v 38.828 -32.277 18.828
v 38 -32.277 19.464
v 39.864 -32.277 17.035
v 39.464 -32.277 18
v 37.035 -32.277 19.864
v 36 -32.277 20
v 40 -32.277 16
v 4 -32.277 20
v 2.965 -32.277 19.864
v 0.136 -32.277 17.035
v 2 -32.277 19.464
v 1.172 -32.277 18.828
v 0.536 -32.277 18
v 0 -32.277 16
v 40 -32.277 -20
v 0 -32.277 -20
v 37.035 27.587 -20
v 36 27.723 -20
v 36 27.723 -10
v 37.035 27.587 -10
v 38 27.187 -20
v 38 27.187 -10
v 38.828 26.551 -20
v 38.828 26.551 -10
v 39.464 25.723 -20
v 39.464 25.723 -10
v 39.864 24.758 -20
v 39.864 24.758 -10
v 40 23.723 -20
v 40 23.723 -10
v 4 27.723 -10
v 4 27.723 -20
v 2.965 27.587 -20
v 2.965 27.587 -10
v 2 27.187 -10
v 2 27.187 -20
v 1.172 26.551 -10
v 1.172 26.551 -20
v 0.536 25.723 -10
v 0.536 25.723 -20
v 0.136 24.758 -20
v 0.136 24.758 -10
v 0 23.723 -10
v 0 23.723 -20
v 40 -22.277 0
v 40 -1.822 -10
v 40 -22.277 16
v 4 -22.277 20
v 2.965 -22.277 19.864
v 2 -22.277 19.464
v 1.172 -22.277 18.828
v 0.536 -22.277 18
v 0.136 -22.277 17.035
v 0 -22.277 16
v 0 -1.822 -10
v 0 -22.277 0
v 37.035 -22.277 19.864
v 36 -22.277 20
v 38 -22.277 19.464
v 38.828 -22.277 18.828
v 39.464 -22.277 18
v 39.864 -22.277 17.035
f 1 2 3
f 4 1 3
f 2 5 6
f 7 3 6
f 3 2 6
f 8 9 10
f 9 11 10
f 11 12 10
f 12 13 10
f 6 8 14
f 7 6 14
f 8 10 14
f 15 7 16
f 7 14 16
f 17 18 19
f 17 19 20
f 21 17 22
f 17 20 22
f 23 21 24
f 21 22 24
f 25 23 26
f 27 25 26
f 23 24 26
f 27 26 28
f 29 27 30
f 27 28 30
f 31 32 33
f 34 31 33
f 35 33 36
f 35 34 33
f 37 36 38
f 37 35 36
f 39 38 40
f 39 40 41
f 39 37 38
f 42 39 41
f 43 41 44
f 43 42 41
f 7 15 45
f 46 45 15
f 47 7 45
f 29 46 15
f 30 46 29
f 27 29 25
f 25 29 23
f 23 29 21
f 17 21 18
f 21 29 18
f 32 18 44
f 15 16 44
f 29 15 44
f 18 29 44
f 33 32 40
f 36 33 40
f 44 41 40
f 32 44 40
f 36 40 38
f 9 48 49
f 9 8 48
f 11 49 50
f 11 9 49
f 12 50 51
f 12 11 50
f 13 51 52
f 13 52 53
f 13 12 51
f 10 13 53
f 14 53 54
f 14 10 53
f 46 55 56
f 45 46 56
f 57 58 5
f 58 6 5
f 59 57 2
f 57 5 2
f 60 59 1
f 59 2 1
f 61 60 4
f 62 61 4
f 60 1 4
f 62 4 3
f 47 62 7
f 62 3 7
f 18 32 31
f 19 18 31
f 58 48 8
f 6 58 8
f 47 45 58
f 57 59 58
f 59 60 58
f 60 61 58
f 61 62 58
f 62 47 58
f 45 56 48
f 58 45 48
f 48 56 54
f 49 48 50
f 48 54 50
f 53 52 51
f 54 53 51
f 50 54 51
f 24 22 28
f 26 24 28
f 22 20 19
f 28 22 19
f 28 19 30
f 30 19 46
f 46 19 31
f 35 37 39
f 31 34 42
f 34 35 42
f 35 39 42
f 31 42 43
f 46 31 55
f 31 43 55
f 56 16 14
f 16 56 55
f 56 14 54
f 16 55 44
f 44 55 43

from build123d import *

# Parameters (mm, degrees)
F1_DEPTH = 40
F2_R     = 4


with BuildPart() as f1:
    # F0 (on Right) → F1 (new body)
    with BuildSketch(Plane.YZ):
        Polygon((-32.277047, 20), (-32.277047, -20), (27.722953, -20), (27.722953, -10), (-1.822363, -10), (-22.277047, 0), (-22.277047, 20), align=None)
    extrude(amount=F1_DEPTH)

    # F2
    f2_edges = [f1.edges().sort_by_distance(p)[0] for p in [
        (40, -27.277047, 20),
        (0, -27.277047, 20),
        (40, 27.722953, -15),
        (0, 27.722953, -15),
    ]]
    fillet(f2_edges, radius=F2_R)


solid = f1.part
